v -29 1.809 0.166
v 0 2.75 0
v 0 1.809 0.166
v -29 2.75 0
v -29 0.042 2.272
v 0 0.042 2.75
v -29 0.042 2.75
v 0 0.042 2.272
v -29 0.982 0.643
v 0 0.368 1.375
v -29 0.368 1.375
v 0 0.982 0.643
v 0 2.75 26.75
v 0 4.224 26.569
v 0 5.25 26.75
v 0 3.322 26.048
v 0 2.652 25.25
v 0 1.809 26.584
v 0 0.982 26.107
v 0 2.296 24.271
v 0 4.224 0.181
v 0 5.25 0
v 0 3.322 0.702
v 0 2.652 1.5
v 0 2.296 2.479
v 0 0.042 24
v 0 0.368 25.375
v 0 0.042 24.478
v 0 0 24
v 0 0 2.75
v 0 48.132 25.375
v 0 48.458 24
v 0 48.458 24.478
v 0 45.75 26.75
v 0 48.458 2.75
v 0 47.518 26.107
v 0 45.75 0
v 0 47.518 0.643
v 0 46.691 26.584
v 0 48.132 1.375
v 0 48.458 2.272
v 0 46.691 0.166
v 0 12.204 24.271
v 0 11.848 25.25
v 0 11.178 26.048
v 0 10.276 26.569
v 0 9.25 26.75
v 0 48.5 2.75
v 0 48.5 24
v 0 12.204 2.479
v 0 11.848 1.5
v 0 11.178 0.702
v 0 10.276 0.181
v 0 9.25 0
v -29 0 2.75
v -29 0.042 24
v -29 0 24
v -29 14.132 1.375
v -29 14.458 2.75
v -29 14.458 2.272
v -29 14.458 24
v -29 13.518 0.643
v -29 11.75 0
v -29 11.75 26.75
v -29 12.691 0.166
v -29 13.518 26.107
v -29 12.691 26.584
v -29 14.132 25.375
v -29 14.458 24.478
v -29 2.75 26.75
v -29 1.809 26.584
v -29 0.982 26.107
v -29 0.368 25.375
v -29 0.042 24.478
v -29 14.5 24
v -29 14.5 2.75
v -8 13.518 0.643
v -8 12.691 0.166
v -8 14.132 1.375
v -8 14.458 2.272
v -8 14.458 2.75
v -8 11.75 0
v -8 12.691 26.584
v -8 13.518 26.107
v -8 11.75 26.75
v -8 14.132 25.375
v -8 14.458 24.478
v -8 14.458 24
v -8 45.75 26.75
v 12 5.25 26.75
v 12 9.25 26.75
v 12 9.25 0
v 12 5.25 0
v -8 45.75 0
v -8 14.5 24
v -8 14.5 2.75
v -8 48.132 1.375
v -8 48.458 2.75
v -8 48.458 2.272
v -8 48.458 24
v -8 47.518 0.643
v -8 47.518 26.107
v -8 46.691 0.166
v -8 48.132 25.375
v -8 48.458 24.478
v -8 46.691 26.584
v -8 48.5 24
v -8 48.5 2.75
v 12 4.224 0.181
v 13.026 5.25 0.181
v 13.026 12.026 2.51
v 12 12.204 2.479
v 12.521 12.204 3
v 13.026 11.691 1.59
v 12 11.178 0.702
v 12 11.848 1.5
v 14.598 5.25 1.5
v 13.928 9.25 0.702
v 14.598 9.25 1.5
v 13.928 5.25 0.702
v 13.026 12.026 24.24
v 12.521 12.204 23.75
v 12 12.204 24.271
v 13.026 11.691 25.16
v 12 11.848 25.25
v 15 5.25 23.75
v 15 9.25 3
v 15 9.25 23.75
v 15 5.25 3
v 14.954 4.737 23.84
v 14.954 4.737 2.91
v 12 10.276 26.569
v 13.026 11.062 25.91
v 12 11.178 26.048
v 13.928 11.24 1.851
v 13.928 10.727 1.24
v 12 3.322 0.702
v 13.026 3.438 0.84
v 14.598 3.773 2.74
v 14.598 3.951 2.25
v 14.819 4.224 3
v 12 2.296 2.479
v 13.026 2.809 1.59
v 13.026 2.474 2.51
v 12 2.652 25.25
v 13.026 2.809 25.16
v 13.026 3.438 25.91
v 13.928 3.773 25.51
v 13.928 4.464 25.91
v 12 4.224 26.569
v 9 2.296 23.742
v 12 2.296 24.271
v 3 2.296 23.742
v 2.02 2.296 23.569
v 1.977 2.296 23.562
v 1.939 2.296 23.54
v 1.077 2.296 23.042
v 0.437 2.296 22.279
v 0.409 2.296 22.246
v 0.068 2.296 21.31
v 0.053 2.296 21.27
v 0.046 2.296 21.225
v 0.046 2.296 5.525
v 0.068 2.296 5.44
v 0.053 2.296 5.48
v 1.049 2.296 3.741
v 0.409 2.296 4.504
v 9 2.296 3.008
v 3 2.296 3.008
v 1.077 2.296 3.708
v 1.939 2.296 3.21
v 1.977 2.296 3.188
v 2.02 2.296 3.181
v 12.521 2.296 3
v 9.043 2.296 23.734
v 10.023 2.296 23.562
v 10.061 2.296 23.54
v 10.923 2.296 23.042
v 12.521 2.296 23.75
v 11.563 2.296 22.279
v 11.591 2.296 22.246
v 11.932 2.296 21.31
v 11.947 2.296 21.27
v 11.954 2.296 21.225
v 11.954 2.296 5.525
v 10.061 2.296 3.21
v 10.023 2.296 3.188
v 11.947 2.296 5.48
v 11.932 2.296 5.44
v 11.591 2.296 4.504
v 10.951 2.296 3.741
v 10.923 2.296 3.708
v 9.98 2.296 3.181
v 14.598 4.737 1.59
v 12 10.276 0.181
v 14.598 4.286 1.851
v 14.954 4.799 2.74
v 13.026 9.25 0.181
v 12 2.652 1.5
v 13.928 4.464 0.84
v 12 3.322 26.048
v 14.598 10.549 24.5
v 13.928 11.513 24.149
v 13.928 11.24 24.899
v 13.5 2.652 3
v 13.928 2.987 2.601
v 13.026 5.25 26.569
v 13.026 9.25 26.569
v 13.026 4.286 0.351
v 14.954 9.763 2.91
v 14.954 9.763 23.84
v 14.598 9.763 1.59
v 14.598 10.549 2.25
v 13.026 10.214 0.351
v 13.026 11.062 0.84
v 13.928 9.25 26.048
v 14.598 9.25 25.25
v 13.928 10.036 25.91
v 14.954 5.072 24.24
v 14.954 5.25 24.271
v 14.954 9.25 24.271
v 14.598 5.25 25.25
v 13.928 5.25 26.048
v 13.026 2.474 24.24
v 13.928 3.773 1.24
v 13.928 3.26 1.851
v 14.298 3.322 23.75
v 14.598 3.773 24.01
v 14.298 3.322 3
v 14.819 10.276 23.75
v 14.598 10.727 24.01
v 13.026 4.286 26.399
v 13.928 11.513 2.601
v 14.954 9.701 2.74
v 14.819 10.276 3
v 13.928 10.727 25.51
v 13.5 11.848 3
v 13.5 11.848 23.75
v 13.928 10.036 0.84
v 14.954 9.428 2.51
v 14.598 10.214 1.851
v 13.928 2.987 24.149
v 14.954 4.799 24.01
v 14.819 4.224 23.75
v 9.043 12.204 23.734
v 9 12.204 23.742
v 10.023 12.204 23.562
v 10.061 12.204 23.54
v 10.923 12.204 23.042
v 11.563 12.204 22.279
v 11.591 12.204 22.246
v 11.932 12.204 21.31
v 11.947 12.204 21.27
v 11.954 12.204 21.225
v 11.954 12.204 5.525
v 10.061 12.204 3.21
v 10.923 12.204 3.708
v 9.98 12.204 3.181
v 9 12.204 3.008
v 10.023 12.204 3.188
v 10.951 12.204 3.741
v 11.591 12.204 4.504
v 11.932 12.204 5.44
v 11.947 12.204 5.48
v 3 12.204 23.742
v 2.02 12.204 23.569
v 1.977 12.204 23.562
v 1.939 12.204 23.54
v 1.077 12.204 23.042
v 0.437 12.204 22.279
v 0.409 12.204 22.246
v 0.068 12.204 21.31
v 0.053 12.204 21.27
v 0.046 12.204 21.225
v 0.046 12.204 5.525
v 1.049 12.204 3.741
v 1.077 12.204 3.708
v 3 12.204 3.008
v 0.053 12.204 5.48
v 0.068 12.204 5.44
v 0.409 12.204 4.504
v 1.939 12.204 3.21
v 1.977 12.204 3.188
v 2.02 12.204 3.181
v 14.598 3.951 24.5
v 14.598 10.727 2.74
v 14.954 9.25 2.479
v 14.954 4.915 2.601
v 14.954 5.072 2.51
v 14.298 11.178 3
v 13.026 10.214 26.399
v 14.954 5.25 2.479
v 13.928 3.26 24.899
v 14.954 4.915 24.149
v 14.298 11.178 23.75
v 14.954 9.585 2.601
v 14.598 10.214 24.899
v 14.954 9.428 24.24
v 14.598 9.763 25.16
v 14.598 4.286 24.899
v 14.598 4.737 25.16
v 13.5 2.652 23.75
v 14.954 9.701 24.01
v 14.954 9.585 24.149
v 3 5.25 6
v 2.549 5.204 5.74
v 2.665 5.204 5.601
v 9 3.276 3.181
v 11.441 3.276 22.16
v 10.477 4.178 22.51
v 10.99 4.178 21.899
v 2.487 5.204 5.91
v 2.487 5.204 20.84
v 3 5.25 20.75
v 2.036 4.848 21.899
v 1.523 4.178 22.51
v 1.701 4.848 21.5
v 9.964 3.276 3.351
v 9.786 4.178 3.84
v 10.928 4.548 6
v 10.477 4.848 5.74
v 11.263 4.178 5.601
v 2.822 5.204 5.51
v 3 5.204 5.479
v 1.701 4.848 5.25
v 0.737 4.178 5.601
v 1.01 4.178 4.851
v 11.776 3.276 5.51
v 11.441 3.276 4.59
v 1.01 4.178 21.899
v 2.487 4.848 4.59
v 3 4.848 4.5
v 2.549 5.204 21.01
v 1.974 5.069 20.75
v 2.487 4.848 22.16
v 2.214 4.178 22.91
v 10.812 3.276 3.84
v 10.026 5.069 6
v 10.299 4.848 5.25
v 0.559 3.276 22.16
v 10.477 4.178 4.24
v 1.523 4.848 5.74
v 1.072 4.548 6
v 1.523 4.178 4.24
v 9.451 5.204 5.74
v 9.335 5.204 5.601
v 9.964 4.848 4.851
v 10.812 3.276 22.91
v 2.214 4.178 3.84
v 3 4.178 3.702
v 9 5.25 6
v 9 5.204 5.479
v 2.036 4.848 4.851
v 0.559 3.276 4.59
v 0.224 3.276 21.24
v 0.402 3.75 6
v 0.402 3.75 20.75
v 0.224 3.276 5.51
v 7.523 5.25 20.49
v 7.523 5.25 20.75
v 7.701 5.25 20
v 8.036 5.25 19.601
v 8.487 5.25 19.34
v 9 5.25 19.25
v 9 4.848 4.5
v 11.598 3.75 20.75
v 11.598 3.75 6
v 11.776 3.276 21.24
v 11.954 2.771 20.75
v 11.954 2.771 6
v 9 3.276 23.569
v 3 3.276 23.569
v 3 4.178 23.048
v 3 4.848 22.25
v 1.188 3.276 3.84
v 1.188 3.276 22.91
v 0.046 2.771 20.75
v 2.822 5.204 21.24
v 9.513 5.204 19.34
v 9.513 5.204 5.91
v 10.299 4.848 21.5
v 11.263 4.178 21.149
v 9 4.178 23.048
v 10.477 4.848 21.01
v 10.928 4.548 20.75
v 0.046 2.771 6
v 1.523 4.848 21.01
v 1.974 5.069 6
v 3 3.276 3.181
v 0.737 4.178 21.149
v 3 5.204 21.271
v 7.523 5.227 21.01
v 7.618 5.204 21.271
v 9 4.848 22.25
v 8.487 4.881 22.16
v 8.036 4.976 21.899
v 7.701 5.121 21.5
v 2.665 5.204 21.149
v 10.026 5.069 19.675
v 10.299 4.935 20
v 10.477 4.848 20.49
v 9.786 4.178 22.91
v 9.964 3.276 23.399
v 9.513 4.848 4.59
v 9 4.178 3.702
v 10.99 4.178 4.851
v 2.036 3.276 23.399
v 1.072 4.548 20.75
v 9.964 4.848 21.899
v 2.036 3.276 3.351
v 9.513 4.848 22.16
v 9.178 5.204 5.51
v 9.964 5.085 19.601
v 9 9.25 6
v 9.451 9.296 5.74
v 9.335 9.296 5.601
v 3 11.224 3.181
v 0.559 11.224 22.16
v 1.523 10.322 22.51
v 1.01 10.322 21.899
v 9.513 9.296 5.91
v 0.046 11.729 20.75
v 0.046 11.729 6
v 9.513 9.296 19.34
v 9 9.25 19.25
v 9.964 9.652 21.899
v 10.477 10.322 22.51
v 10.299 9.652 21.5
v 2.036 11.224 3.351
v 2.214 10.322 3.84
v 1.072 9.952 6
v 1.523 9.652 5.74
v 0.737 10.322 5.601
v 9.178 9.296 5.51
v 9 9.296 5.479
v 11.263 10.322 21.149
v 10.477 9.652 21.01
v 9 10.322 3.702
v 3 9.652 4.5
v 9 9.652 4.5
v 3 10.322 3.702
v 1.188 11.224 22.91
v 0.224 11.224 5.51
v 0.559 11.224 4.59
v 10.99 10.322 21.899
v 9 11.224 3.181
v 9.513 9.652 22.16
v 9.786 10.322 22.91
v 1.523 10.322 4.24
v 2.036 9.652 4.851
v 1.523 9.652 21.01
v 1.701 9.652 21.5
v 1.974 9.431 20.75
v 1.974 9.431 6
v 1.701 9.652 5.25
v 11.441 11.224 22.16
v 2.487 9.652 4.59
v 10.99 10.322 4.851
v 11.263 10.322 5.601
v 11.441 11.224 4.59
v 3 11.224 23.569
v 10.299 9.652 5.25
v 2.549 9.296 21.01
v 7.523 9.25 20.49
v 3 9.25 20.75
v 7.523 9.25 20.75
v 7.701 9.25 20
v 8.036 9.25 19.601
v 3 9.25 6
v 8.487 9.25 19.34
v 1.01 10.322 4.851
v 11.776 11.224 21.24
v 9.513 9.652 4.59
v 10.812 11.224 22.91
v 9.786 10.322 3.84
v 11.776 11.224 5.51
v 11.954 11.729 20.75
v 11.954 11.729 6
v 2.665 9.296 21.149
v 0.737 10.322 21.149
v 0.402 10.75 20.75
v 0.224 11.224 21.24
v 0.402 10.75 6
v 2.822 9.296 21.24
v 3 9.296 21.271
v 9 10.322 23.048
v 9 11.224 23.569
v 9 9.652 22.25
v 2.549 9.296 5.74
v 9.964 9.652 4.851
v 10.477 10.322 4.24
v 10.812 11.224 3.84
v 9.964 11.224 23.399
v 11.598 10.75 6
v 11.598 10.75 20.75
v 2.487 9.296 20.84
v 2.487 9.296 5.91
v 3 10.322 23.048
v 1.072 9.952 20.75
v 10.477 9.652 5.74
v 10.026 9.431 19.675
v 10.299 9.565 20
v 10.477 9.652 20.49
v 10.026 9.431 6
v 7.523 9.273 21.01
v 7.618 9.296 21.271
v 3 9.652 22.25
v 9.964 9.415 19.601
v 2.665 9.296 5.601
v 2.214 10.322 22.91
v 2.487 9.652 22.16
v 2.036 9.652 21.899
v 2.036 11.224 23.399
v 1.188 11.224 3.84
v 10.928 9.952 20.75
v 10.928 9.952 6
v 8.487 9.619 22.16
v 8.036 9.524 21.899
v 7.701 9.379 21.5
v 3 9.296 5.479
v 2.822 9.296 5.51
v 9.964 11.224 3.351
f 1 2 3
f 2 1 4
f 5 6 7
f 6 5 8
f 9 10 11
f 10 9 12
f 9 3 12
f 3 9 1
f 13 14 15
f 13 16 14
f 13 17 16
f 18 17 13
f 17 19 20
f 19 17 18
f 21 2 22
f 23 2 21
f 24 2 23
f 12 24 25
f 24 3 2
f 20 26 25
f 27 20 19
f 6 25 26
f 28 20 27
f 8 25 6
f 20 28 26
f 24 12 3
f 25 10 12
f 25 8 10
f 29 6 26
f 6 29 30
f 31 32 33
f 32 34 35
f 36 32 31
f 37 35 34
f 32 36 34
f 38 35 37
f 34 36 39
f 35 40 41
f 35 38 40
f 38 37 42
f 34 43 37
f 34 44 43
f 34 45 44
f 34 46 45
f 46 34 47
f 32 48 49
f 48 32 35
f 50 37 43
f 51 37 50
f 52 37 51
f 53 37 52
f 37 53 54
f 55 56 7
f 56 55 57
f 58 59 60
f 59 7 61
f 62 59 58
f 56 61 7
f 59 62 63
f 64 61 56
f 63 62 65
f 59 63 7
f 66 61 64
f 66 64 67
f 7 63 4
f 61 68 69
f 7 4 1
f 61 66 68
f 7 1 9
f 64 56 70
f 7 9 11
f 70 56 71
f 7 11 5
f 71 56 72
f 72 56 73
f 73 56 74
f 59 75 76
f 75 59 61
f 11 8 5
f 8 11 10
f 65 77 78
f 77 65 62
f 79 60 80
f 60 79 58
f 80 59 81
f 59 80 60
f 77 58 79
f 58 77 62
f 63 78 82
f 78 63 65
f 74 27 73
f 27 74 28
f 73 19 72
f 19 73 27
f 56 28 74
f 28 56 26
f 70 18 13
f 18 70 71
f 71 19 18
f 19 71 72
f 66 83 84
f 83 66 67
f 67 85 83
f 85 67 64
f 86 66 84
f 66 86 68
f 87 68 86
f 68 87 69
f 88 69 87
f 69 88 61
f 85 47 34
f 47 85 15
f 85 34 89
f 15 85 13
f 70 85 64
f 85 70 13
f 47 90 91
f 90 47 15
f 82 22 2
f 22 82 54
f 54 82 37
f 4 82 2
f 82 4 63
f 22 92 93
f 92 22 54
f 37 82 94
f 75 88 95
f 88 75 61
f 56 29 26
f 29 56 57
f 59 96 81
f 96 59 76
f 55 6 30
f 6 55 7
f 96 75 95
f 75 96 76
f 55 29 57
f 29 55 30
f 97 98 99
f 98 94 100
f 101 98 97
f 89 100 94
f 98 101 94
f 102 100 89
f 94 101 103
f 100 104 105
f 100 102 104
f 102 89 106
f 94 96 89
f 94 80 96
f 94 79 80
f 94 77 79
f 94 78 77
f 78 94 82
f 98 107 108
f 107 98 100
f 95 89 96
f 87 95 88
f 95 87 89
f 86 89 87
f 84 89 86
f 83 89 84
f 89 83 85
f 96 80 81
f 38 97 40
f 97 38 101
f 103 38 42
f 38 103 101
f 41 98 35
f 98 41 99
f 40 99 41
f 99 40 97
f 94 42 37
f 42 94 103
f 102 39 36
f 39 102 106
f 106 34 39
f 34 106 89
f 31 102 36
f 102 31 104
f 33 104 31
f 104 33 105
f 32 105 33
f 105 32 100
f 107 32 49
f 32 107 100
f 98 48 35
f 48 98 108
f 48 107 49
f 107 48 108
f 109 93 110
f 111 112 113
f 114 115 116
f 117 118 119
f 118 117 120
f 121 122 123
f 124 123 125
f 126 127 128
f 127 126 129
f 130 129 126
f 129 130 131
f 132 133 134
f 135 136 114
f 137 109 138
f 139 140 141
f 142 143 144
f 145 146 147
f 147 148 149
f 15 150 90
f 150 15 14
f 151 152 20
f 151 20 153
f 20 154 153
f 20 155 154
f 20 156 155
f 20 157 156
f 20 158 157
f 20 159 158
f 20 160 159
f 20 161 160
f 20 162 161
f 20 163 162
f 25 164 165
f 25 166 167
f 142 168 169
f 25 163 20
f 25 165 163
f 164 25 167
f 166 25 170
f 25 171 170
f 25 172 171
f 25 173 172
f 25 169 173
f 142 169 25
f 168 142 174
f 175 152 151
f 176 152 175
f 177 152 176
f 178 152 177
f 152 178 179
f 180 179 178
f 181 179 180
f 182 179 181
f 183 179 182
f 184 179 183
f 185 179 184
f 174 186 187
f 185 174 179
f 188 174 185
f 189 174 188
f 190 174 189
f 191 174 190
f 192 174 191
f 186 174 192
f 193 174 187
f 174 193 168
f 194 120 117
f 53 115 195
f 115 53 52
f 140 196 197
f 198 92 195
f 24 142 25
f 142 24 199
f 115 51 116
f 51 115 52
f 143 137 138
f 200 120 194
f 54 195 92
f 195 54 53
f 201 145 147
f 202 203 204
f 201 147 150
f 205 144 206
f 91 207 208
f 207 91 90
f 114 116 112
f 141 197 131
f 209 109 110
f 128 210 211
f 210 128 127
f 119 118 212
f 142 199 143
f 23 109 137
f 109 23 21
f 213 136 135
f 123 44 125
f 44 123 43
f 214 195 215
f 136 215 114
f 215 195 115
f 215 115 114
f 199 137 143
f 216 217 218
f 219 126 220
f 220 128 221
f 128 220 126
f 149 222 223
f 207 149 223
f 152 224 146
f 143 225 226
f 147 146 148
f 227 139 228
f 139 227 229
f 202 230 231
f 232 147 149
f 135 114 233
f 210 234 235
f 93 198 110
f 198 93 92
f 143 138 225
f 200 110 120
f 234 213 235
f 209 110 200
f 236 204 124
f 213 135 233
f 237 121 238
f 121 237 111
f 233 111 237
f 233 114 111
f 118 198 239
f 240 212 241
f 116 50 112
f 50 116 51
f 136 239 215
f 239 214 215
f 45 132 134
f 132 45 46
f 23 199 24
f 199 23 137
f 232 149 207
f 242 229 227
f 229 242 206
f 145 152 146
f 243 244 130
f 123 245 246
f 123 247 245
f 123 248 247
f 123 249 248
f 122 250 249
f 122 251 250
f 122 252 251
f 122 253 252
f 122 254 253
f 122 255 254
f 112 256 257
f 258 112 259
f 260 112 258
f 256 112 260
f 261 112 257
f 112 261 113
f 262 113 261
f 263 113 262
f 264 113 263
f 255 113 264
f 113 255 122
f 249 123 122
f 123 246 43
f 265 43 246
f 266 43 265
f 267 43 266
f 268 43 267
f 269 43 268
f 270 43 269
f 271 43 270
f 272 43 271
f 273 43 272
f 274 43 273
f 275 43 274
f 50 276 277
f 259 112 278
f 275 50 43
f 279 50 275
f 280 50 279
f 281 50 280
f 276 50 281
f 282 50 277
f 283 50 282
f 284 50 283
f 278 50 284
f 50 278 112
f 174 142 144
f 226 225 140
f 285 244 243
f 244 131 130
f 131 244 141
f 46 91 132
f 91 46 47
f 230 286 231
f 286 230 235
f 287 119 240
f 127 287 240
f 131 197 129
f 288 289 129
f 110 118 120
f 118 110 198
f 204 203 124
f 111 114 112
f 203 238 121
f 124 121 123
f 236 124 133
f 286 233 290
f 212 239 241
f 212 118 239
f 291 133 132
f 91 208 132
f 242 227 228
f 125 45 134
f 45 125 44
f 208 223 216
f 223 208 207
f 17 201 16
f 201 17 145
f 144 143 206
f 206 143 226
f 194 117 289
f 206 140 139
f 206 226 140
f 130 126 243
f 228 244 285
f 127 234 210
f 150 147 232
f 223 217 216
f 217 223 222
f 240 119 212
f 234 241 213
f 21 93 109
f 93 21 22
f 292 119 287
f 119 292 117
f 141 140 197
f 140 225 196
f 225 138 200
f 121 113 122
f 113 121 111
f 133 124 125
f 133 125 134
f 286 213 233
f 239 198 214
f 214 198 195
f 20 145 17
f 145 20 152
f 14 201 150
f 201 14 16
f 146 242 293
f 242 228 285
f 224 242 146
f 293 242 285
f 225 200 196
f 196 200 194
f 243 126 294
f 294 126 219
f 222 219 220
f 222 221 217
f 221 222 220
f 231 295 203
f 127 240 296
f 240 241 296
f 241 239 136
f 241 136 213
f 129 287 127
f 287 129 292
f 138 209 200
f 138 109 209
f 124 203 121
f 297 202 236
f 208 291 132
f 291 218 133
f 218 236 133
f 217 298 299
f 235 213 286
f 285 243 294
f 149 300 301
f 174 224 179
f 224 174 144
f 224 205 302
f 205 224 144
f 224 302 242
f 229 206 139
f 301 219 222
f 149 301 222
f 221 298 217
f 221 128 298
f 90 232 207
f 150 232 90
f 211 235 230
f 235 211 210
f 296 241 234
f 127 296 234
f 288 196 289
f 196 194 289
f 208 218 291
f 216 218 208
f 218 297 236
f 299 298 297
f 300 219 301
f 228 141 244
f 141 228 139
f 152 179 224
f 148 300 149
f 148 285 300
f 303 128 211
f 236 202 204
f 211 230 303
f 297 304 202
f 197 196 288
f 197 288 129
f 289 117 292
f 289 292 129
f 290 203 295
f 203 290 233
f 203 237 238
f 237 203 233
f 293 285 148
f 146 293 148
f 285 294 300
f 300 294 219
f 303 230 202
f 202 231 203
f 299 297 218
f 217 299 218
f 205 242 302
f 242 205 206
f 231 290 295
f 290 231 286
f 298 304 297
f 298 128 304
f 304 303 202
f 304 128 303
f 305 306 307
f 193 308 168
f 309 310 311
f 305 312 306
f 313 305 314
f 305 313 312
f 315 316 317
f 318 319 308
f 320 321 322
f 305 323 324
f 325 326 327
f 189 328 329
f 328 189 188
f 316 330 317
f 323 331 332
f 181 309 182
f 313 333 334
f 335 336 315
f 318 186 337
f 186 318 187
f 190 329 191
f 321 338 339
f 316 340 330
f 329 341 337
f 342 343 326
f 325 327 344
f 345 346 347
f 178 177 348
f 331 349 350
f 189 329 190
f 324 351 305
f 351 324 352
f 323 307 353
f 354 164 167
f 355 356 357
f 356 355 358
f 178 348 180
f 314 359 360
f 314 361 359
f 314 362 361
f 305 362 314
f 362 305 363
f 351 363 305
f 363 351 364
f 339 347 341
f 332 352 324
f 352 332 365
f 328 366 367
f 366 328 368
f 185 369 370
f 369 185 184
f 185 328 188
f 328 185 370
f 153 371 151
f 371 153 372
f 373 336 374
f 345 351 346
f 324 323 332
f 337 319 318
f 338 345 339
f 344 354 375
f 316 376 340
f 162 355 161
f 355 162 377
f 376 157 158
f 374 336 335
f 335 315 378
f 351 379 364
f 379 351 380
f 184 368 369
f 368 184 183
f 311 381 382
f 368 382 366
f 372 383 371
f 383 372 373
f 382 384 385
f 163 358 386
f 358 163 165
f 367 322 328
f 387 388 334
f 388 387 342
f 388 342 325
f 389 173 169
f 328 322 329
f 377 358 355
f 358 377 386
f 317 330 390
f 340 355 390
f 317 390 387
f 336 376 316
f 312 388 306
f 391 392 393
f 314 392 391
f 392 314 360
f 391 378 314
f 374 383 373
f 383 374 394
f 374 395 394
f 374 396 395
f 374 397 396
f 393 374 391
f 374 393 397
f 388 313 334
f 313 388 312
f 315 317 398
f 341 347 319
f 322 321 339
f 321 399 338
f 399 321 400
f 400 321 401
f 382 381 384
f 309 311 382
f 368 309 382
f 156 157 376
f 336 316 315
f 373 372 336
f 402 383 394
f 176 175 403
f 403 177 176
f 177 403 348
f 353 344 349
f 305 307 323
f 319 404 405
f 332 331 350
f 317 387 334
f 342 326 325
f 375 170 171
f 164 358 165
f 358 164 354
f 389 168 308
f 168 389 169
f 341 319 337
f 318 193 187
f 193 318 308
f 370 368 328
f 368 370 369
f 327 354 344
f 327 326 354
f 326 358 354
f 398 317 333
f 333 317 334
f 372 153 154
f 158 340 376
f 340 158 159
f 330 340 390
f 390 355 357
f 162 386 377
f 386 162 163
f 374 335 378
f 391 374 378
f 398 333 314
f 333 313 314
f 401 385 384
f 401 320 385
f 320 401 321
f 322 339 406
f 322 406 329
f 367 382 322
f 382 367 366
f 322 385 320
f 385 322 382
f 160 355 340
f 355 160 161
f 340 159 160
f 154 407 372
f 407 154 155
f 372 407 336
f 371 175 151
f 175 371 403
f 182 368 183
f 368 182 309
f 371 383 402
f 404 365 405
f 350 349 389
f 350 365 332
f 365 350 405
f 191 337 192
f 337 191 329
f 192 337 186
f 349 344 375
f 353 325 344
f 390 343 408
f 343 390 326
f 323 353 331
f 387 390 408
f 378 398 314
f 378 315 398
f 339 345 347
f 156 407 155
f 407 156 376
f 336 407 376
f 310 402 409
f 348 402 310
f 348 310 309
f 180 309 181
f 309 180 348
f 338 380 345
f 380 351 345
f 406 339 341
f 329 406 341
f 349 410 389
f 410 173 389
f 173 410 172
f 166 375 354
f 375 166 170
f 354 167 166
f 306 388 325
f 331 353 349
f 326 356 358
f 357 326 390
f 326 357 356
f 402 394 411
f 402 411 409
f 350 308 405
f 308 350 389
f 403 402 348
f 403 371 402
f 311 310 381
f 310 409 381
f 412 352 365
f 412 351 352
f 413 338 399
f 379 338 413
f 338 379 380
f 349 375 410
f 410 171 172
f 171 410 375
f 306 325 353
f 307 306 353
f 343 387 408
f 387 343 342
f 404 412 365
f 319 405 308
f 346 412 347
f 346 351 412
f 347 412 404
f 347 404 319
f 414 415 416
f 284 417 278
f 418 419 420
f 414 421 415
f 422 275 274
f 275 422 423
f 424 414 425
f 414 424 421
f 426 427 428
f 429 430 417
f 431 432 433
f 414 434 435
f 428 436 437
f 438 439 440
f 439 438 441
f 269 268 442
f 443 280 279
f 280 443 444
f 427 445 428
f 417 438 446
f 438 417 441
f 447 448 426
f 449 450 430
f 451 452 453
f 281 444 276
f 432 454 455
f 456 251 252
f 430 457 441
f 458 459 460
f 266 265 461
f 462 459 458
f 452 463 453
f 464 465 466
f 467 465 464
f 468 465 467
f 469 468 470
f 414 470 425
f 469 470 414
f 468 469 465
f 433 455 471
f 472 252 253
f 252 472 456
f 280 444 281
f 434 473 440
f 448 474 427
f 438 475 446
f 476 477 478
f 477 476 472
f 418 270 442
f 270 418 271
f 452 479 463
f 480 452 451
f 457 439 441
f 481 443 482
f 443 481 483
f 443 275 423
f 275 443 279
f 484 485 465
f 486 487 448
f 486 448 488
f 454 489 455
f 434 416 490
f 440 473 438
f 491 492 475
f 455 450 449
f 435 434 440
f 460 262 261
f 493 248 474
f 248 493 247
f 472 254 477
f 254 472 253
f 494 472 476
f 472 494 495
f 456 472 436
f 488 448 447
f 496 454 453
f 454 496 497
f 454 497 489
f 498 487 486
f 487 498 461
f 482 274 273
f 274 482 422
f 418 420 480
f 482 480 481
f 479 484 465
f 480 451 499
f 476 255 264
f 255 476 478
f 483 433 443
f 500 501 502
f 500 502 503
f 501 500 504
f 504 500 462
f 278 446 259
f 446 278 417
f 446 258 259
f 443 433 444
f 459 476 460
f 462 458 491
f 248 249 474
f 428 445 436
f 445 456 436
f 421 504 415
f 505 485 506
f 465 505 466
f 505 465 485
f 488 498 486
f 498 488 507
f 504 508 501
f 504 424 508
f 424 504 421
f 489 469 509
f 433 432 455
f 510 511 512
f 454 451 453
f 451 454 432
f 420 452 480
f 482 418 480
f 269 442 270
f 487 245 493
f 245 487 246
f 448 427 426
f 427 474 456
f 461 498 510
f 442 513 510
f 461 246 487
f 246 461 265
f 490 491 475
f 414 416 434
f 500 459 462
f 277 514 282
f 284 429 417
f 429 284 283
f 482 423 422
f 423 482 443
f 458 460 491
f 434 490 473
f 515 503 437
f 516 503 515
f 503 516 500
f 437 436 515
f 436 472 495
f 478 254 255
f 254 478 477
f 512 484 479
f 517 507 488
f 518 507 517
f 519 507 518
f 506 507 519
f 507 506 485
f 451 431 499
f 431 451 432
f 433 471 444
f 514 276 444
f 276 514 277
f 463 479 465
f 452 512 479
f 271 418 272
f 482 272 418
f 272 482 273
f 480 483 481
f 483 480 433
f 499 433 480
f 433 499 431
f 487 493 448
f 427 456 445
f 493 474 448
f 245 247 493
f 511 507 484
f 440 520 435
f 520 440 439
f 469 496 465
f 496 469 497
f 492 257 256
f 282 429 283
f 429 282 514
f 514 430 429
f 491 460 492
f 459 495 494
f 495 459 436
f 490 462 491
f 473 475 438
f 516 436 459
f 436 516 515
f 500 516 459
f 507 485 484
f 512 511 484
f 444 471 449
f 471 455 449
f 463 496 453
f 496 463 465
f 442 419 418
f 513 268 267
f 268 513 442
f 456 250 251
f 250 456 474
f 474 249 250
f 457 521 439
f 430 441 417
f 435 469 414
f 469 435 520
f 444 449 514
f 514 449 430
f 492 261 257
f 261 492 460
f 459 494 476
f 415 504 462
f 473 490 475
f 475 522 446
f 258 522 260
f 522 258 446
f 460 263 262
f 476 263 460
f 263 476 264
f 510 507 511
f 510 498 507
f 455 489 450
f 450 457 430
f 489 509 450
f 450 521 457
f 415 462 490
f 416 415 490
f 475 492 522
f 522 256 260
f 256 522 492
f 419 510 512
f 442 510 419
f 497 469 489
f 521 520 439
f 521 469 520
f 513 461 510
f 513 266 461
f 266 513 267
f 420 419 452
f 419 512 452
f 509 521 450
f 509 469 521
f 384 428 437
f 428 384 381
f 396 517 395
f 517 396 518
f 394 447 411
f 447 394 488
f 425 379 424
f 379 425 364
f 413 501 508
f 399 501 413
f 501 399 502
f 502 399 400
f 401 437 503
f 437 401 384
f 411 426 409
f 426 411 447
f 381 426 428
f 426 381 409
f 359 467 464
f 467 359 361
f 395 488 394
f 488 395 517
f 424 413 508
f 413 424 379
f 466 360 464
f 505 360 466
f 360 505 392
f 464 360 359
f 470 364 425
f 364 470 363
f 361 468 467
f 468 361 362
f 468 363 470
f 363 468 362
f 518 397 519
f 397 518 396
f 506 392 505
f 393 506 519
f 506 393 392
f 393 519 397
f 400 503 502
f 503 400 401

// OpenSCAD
// Door bolt hole height; must be a tight fit
bolt_hole_height = 26.75;
// Door bolt hole width; must be a tight fit
bolt_hole_width = 14.5;
// Door bolt hole depth
bolt_hole_depth = 21;

// Door bolt hole corner radius
bolt_hole_corner_radius = 2.75;

// Door stopper tongue length; must be long enough so gap between door and frame is sufficiently large
tongue_length = 34;
// Door stopper tongue thickness; must be thick enough so door is blocked and doesn't slide past tongue
tongue_thickness = 8;

// Pull handle inset (determines handle width = bolt hole width - 2 * inset)
handle_inset = 2.25;
// Pull handle length
handle_length = 15;
// Whether to include a hole (for a strap to hang from door when not inserted) or not
handle_hole = true;


/* [Hidden] */

// Door tongue inset dimensions
h = bolt_hole_height;
w = bolt_hole_width;
d = bolt_hole_depth;

rad = bolt_hole_corner_radius;

// Door parameters
l = tongue_length;
thk = tongue_thickness;

// Handle parameters
h_inset = handle_inset;
h_d = handle_length;
hole_r = 3/2;
hole = handle_hole;

h_w = w - 2*h_inset;  // must be <= w
h_or = 3;  // outer corner rounding radius
h_ir = 3;  // inner rounding radius
h_rim = 3; // finger notch rim

$fn=18;

// ****  FROM lib/util.scad
module roundedCube4(dim, r, center=false) {
  width = dim[0];
  height = dim[1];
  depth = dim[2];
  centerx = (center[0] == undef ? center : center[0]);
  centery = (center[1] == undef ? center : center[1]);
  centerz = (center[2] == undef ? center : center[2]);
  translate([centerx ? -width/2 : 0, centery ? -height/2 : 0, centerz ? -depth/2 : 0]) union() {
    translate([0, r, 0]) cube([width, height-2*r, depth]);
    translate([r, 0, 0]) cube([width-2*r, height, depth]);
    for (xy = [[r, r],
               [r, height-r],
               [width-r, r],
               [width-r, height-r]]) {
      translate([xy[0], xy[1], 0]) cylinder(r = r, h = depth);
    }
  }
}

// TODO FIXME: dim[2] is not obeyed and top is filleted when dim[2] is >r but <2*r, because corner sphere diameter exceeds height  (should be a half-sphere, in principle)
module roundedCube6(dim, r, center=false) {
  width = dim[0];
  height = dim[1];
  depth = dim[2];
  centerx = (center[0] == undef ? center : center[0]);
  centery = (center[1] == undef ? center : center[1]);
  centerz = (center[2] == undef ? center : center[2]);
  translate([r - (centerx ? width/2 : 0), r - (centery ? height/2 : 0), r - (centerz ? depth/2 : 0)]) hull() {
    // Edges
    translate([0, 0, 0]) rotate([-90, 0, 0]) cylinder(h = height-2*r,r = r);
    translate([width-2*r, 0, 0]) rotate([-90, 0, 0]) cylinder(h = height-2*r,r = r);
    translate([0, 0, 0]) rotate([0, 90, 0]) cylinder(h = width-2*r, r = r);
    translate([0, height-2*r, 0]) rotate([0, 90, 0]) cylinder(h = width-2*r, r = r);
    translate([0, 0, 0]) cylinder(h = depth-r, r = r);
    translate([width-2*r, 0, 0]) cylinder(h = depth-r, r = r);
    translate([0, height-2*r, 0]) cylinder(h = depth-r, r = r);
    translate([width-2*r, height-2*r, 0]) cylinder(h = depth-r, r = r);

    // Corners
    translate([0,0,0]) sphere(r);
    translate([width-2*r, 0, 0]) sphere(r);
    translate([0, height-2*r, 0]) sphere(r);
    translate([width-2*r, height-2*r, 0]) sphere(r);
  }
}

//  *****  END FROM lib/util.scad

rotate([0, -90, 0]) union() {
  roundedCube4([h, w, d+thk], r=rad);
  roundedCube4([h, w+l, thk], r=rad);
  translate([0, (w-h_w)/2, -h_d]) difference() {
    roundedCube6([h, h_w, h_d+thk], r=h_or);
    translate([h_rim, h_rim, h_rim]) rotate([90, 0, 0]) roundedCube6([h-2*h_rim, h_d-h_rim, 2*h_rim], r=h_ir);
    translate([h_rim, h_w-h_rim, h_d]) rotate([-90, 0, 0]) roundedCube6([h-2*h_rim, h_d-h_rim, 2*h_rim], r=h_ir);  
    if (hole) {
      translate([h-h_rim-h_ir, -1, h_rim+h_ir]) rotate([-90, 0, 0]) cylinder(r=hole_r, h=h_w+2);
    } 
  }
}
